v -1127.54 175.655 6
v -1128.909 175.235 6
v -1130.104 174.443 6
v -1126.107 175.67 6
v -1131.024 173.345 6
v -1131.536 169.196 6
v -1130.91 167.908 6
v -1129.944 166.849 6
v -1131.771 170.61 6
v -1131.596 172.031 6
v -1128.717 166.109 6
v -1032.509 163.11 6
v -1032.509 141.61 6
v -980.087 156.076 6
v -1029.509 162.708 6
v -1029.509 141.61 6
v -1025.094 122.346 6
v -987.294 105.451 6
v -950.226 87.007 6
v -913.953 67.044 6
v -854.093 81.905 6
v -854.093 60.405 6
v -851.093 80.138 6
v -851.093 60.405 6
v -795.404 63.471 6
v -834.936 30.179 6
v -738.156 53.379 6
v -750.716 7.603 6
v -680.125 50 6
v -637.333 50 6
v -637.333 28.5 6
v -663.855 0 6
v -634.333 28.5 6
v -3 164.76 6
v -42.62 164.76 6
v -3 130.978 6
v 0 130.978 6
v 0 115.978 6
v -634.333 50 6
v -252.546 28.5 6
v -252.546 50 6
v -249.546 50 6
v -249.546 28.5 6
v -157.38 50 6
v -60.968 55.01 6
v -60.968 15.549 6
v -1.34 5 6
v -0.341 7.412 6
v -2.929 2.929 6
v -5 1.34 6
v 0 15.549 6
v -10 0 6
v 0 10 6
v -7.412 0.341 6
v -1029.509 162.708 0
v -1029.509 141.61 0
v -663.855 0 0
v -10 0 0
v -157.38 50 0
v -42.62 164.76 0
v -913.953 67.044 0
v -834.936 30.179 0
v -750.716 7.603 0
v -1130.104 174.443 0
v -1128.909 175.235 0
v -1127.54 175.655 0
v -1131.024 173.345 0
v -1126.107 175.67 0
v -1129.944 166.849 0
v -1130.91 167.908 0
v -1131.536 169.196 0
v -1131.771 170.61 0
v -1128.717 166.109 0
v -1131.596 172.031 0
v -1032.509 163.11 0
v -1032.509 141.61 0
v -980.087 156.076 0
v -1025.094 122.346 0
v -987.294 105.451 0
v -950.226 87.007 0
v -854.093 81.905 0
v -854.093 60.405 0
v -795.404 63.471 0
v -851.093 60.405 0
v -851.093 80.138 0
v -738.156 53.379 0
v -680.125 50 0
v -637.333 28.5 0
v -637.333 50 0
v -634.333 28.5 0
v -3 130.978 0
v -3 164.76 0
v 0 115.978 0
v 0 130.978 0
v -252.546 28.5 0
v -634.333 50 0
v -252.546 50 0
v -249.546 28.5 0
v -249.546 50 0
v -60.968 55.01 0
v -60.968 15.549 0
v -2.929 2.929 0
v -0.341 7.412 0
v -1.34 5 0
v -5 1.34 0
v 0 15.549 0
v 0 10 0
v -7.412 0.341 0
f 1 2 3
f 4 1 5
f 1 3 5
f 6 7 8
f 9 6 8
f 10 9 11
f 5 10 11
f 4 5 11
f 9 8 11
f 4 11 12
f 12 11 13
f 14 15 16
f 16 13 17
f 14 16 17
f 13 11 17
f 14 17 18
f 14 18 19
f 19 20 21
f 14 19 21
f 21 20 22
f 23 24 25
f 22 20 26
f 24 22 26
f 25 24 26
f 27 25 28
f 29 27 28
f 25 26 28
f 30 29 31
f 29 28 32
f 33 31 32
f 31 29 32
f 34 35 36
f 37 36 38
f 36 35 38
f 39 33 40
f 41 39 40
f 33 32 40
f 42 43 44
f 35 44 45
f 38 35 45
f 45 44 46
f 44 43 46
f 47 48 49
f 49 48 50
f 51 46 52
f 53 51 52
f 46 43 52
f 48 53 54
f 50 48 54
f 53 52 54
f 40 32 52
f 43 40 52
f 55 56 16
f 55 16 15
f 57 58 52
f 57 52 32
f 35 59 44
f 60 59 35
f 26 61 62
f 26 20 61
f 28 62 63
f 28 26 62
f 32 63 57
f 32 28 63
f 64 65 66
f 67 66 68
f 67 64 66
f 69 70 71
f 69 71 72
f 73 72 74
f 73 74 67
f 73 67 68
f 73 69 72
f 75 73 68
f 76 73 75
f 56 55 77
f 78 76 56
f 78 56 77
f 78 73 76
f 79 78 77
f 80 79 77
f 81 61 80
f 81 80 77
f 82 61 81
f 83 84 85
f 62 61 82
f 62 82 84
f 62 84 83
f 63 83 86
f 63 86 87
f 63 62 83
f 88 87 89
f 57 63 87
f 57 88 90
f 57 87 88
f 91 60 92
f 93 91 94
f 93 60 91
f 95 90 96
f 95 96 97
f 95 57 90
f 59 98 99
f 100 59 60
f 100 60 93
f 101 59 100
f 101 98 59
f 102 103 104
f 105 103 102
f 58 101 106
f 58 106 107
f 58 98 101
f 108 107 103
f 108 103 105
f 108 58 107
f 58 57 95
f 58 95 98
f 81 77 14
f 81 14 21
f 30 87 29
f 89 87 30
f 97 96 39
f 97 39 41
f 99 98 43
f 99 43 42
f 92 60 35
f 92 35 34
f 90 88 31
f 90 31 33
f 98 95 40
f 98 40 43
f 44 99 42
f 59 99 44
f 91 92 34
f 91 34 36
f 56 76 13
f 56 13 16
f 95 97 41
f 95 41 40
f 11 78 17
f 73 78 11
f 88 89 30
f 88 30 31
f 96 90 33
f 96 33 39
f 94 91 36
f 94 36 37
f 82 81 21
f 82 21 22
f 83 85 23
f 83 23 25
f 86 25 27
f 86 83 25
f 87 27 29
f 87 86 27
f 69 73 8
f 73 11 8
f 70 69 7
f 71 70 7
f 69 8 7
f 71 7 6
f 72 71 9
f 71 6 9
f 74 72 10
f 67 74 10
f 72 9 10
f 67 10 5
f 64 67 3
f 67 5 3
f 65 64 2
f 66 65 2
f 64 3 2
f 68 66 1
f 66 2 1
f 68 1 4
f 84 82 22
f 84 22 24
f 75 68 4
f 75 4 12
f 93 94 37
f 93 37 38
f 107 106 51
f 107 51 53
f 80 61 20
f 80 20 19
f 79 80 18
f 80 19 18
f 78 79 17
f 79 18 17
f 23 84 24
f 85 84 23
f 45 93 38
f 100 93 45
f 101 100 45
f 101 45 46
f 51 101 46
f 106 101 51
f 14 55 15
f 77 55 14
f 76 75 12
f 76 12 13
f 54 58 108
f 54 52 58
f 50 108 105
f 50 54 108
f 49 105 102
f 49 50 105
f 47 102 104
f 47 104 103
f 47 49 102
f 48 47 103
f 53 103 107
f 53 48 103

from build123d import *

# Parameters (mm, degrees)
BOSS_EXTRU_1_DEPTH = 6
CONG_1_R           = 1000
CONG_2_R           = 500
CONG_4_R           = 10
CONG_5_R           = 5
CONG_6_R           = 500


with BuildPart() as part:
    # Esquisse2 → Boss.-Extru.1 (new body)
    with BuildSketch(Plane.XY):
        Polygon((0, 0), (-800, 0), (-963.993473565, 96.541430402), (-1163.117471936, 180.636697165), (-1032.508966499, 163.110428865), (-1032.508966499, 141.610428865), (-1029.508966499, 141.610428865), (-1029.508966499, 162.707860864), (-980.08668451, 156.075917781), (-854.092873153, 81.904534581), (-854.092873153, 60.404534581), (-851.092873153, 60.404534581), (-851.092873153, 80.138462524), (-799.897120857, 50), (-637.333486788, 50), (-637.333486788, 28.5), (-634.333486788, 28.5), (-634.333486788, 50), (-252.546237876, 50), (-252.546237876, 28.5), (-249.546237876, 28.5), (-249.546237876, 50), (-157.380204695, 50), (-42.620023216, 164.760181479), (-3, 164.760181479), (-3, 130.978409526), (0, 130.978409526), (0, 115.978409526), (-60.96795982, 55.010449706), (-60.96795982, 15.54862942), (0, 15.54862942), align=None)
    extrude(amount=BOSS_EXTRU_1_DEPTH)

    # Congé1
    cong_1_edges = [part.edges().sort_by_distance(p)[0] for p in [
        (-963.993473565, 96.541430402, 3),
    ]]
    fillet(cong_1_edges, radius=CONG_1_R)

    # Congé2
    cong_2_edges = [part.edges().sort_by_distance(p)[0] for p in [
        (-800, 0, 3),
    ]]
    fillet(cong_2_edges, radius=CONG_2_R)

    # Congé4
    cong_4_edges = [part.edges().sort_by_distance(p)[0] for p in [
        (0, 0, 3),
    ]]
    fillet(cong_4_edges, radius=CONG_4_R)

    # Congé5
    cong_5_edges = [part.edges().sort_by_distance(p)[0] for p in [
        (-1163.117471936, 180.636697165, 3),
    ]]
    fillet(cong_5_edges, radius=CONG_5_R)

    # Congé6
    # the kernel refuses this fillet: 500 mm, written as the material it adds along each edge
    with BuildSketch(Plane(origin=(-799.897120857, 50, 0), x_dir=(-0.8617626627439038, 0.5073116528333809, 0), z_dir=(0, 0, 1))) as cong_6_piece_1_section:
        with BuildLine():
            CenterArc((150.440377281, -491.643304898), CONG_6_R, 100.490027974, 19.994897644)
            Line((-103.215449136, -60.761973526), (-108.288565664, -52.144346898))
            Line((-108.288565664, -52.144346898), (-5.073116528, 8.617626627))
            Line((-5.073116528, 8.617626627), (0, 10))
            ThreePointArc((0, 10), (29.704090529, 10), (57.587537133, 9.832866098))
            Line((57.587537133, 9.832866098), (59.408181057, 0))
        make_face()
    cong_6_piece_1 = extrude(amount=6, mode=Mode.PRIVATE)
    cong_6_piece_1 = split(cong_6_piece_1, bisect_by=Plane(origin=(-851.092873153, 52.596718386, 3), z_dir=(1, 0, 0)), keep=Keep.TOP, mode=Mode.PRIVATE)
    add(cong_6_piece_1)


solid = part.part
